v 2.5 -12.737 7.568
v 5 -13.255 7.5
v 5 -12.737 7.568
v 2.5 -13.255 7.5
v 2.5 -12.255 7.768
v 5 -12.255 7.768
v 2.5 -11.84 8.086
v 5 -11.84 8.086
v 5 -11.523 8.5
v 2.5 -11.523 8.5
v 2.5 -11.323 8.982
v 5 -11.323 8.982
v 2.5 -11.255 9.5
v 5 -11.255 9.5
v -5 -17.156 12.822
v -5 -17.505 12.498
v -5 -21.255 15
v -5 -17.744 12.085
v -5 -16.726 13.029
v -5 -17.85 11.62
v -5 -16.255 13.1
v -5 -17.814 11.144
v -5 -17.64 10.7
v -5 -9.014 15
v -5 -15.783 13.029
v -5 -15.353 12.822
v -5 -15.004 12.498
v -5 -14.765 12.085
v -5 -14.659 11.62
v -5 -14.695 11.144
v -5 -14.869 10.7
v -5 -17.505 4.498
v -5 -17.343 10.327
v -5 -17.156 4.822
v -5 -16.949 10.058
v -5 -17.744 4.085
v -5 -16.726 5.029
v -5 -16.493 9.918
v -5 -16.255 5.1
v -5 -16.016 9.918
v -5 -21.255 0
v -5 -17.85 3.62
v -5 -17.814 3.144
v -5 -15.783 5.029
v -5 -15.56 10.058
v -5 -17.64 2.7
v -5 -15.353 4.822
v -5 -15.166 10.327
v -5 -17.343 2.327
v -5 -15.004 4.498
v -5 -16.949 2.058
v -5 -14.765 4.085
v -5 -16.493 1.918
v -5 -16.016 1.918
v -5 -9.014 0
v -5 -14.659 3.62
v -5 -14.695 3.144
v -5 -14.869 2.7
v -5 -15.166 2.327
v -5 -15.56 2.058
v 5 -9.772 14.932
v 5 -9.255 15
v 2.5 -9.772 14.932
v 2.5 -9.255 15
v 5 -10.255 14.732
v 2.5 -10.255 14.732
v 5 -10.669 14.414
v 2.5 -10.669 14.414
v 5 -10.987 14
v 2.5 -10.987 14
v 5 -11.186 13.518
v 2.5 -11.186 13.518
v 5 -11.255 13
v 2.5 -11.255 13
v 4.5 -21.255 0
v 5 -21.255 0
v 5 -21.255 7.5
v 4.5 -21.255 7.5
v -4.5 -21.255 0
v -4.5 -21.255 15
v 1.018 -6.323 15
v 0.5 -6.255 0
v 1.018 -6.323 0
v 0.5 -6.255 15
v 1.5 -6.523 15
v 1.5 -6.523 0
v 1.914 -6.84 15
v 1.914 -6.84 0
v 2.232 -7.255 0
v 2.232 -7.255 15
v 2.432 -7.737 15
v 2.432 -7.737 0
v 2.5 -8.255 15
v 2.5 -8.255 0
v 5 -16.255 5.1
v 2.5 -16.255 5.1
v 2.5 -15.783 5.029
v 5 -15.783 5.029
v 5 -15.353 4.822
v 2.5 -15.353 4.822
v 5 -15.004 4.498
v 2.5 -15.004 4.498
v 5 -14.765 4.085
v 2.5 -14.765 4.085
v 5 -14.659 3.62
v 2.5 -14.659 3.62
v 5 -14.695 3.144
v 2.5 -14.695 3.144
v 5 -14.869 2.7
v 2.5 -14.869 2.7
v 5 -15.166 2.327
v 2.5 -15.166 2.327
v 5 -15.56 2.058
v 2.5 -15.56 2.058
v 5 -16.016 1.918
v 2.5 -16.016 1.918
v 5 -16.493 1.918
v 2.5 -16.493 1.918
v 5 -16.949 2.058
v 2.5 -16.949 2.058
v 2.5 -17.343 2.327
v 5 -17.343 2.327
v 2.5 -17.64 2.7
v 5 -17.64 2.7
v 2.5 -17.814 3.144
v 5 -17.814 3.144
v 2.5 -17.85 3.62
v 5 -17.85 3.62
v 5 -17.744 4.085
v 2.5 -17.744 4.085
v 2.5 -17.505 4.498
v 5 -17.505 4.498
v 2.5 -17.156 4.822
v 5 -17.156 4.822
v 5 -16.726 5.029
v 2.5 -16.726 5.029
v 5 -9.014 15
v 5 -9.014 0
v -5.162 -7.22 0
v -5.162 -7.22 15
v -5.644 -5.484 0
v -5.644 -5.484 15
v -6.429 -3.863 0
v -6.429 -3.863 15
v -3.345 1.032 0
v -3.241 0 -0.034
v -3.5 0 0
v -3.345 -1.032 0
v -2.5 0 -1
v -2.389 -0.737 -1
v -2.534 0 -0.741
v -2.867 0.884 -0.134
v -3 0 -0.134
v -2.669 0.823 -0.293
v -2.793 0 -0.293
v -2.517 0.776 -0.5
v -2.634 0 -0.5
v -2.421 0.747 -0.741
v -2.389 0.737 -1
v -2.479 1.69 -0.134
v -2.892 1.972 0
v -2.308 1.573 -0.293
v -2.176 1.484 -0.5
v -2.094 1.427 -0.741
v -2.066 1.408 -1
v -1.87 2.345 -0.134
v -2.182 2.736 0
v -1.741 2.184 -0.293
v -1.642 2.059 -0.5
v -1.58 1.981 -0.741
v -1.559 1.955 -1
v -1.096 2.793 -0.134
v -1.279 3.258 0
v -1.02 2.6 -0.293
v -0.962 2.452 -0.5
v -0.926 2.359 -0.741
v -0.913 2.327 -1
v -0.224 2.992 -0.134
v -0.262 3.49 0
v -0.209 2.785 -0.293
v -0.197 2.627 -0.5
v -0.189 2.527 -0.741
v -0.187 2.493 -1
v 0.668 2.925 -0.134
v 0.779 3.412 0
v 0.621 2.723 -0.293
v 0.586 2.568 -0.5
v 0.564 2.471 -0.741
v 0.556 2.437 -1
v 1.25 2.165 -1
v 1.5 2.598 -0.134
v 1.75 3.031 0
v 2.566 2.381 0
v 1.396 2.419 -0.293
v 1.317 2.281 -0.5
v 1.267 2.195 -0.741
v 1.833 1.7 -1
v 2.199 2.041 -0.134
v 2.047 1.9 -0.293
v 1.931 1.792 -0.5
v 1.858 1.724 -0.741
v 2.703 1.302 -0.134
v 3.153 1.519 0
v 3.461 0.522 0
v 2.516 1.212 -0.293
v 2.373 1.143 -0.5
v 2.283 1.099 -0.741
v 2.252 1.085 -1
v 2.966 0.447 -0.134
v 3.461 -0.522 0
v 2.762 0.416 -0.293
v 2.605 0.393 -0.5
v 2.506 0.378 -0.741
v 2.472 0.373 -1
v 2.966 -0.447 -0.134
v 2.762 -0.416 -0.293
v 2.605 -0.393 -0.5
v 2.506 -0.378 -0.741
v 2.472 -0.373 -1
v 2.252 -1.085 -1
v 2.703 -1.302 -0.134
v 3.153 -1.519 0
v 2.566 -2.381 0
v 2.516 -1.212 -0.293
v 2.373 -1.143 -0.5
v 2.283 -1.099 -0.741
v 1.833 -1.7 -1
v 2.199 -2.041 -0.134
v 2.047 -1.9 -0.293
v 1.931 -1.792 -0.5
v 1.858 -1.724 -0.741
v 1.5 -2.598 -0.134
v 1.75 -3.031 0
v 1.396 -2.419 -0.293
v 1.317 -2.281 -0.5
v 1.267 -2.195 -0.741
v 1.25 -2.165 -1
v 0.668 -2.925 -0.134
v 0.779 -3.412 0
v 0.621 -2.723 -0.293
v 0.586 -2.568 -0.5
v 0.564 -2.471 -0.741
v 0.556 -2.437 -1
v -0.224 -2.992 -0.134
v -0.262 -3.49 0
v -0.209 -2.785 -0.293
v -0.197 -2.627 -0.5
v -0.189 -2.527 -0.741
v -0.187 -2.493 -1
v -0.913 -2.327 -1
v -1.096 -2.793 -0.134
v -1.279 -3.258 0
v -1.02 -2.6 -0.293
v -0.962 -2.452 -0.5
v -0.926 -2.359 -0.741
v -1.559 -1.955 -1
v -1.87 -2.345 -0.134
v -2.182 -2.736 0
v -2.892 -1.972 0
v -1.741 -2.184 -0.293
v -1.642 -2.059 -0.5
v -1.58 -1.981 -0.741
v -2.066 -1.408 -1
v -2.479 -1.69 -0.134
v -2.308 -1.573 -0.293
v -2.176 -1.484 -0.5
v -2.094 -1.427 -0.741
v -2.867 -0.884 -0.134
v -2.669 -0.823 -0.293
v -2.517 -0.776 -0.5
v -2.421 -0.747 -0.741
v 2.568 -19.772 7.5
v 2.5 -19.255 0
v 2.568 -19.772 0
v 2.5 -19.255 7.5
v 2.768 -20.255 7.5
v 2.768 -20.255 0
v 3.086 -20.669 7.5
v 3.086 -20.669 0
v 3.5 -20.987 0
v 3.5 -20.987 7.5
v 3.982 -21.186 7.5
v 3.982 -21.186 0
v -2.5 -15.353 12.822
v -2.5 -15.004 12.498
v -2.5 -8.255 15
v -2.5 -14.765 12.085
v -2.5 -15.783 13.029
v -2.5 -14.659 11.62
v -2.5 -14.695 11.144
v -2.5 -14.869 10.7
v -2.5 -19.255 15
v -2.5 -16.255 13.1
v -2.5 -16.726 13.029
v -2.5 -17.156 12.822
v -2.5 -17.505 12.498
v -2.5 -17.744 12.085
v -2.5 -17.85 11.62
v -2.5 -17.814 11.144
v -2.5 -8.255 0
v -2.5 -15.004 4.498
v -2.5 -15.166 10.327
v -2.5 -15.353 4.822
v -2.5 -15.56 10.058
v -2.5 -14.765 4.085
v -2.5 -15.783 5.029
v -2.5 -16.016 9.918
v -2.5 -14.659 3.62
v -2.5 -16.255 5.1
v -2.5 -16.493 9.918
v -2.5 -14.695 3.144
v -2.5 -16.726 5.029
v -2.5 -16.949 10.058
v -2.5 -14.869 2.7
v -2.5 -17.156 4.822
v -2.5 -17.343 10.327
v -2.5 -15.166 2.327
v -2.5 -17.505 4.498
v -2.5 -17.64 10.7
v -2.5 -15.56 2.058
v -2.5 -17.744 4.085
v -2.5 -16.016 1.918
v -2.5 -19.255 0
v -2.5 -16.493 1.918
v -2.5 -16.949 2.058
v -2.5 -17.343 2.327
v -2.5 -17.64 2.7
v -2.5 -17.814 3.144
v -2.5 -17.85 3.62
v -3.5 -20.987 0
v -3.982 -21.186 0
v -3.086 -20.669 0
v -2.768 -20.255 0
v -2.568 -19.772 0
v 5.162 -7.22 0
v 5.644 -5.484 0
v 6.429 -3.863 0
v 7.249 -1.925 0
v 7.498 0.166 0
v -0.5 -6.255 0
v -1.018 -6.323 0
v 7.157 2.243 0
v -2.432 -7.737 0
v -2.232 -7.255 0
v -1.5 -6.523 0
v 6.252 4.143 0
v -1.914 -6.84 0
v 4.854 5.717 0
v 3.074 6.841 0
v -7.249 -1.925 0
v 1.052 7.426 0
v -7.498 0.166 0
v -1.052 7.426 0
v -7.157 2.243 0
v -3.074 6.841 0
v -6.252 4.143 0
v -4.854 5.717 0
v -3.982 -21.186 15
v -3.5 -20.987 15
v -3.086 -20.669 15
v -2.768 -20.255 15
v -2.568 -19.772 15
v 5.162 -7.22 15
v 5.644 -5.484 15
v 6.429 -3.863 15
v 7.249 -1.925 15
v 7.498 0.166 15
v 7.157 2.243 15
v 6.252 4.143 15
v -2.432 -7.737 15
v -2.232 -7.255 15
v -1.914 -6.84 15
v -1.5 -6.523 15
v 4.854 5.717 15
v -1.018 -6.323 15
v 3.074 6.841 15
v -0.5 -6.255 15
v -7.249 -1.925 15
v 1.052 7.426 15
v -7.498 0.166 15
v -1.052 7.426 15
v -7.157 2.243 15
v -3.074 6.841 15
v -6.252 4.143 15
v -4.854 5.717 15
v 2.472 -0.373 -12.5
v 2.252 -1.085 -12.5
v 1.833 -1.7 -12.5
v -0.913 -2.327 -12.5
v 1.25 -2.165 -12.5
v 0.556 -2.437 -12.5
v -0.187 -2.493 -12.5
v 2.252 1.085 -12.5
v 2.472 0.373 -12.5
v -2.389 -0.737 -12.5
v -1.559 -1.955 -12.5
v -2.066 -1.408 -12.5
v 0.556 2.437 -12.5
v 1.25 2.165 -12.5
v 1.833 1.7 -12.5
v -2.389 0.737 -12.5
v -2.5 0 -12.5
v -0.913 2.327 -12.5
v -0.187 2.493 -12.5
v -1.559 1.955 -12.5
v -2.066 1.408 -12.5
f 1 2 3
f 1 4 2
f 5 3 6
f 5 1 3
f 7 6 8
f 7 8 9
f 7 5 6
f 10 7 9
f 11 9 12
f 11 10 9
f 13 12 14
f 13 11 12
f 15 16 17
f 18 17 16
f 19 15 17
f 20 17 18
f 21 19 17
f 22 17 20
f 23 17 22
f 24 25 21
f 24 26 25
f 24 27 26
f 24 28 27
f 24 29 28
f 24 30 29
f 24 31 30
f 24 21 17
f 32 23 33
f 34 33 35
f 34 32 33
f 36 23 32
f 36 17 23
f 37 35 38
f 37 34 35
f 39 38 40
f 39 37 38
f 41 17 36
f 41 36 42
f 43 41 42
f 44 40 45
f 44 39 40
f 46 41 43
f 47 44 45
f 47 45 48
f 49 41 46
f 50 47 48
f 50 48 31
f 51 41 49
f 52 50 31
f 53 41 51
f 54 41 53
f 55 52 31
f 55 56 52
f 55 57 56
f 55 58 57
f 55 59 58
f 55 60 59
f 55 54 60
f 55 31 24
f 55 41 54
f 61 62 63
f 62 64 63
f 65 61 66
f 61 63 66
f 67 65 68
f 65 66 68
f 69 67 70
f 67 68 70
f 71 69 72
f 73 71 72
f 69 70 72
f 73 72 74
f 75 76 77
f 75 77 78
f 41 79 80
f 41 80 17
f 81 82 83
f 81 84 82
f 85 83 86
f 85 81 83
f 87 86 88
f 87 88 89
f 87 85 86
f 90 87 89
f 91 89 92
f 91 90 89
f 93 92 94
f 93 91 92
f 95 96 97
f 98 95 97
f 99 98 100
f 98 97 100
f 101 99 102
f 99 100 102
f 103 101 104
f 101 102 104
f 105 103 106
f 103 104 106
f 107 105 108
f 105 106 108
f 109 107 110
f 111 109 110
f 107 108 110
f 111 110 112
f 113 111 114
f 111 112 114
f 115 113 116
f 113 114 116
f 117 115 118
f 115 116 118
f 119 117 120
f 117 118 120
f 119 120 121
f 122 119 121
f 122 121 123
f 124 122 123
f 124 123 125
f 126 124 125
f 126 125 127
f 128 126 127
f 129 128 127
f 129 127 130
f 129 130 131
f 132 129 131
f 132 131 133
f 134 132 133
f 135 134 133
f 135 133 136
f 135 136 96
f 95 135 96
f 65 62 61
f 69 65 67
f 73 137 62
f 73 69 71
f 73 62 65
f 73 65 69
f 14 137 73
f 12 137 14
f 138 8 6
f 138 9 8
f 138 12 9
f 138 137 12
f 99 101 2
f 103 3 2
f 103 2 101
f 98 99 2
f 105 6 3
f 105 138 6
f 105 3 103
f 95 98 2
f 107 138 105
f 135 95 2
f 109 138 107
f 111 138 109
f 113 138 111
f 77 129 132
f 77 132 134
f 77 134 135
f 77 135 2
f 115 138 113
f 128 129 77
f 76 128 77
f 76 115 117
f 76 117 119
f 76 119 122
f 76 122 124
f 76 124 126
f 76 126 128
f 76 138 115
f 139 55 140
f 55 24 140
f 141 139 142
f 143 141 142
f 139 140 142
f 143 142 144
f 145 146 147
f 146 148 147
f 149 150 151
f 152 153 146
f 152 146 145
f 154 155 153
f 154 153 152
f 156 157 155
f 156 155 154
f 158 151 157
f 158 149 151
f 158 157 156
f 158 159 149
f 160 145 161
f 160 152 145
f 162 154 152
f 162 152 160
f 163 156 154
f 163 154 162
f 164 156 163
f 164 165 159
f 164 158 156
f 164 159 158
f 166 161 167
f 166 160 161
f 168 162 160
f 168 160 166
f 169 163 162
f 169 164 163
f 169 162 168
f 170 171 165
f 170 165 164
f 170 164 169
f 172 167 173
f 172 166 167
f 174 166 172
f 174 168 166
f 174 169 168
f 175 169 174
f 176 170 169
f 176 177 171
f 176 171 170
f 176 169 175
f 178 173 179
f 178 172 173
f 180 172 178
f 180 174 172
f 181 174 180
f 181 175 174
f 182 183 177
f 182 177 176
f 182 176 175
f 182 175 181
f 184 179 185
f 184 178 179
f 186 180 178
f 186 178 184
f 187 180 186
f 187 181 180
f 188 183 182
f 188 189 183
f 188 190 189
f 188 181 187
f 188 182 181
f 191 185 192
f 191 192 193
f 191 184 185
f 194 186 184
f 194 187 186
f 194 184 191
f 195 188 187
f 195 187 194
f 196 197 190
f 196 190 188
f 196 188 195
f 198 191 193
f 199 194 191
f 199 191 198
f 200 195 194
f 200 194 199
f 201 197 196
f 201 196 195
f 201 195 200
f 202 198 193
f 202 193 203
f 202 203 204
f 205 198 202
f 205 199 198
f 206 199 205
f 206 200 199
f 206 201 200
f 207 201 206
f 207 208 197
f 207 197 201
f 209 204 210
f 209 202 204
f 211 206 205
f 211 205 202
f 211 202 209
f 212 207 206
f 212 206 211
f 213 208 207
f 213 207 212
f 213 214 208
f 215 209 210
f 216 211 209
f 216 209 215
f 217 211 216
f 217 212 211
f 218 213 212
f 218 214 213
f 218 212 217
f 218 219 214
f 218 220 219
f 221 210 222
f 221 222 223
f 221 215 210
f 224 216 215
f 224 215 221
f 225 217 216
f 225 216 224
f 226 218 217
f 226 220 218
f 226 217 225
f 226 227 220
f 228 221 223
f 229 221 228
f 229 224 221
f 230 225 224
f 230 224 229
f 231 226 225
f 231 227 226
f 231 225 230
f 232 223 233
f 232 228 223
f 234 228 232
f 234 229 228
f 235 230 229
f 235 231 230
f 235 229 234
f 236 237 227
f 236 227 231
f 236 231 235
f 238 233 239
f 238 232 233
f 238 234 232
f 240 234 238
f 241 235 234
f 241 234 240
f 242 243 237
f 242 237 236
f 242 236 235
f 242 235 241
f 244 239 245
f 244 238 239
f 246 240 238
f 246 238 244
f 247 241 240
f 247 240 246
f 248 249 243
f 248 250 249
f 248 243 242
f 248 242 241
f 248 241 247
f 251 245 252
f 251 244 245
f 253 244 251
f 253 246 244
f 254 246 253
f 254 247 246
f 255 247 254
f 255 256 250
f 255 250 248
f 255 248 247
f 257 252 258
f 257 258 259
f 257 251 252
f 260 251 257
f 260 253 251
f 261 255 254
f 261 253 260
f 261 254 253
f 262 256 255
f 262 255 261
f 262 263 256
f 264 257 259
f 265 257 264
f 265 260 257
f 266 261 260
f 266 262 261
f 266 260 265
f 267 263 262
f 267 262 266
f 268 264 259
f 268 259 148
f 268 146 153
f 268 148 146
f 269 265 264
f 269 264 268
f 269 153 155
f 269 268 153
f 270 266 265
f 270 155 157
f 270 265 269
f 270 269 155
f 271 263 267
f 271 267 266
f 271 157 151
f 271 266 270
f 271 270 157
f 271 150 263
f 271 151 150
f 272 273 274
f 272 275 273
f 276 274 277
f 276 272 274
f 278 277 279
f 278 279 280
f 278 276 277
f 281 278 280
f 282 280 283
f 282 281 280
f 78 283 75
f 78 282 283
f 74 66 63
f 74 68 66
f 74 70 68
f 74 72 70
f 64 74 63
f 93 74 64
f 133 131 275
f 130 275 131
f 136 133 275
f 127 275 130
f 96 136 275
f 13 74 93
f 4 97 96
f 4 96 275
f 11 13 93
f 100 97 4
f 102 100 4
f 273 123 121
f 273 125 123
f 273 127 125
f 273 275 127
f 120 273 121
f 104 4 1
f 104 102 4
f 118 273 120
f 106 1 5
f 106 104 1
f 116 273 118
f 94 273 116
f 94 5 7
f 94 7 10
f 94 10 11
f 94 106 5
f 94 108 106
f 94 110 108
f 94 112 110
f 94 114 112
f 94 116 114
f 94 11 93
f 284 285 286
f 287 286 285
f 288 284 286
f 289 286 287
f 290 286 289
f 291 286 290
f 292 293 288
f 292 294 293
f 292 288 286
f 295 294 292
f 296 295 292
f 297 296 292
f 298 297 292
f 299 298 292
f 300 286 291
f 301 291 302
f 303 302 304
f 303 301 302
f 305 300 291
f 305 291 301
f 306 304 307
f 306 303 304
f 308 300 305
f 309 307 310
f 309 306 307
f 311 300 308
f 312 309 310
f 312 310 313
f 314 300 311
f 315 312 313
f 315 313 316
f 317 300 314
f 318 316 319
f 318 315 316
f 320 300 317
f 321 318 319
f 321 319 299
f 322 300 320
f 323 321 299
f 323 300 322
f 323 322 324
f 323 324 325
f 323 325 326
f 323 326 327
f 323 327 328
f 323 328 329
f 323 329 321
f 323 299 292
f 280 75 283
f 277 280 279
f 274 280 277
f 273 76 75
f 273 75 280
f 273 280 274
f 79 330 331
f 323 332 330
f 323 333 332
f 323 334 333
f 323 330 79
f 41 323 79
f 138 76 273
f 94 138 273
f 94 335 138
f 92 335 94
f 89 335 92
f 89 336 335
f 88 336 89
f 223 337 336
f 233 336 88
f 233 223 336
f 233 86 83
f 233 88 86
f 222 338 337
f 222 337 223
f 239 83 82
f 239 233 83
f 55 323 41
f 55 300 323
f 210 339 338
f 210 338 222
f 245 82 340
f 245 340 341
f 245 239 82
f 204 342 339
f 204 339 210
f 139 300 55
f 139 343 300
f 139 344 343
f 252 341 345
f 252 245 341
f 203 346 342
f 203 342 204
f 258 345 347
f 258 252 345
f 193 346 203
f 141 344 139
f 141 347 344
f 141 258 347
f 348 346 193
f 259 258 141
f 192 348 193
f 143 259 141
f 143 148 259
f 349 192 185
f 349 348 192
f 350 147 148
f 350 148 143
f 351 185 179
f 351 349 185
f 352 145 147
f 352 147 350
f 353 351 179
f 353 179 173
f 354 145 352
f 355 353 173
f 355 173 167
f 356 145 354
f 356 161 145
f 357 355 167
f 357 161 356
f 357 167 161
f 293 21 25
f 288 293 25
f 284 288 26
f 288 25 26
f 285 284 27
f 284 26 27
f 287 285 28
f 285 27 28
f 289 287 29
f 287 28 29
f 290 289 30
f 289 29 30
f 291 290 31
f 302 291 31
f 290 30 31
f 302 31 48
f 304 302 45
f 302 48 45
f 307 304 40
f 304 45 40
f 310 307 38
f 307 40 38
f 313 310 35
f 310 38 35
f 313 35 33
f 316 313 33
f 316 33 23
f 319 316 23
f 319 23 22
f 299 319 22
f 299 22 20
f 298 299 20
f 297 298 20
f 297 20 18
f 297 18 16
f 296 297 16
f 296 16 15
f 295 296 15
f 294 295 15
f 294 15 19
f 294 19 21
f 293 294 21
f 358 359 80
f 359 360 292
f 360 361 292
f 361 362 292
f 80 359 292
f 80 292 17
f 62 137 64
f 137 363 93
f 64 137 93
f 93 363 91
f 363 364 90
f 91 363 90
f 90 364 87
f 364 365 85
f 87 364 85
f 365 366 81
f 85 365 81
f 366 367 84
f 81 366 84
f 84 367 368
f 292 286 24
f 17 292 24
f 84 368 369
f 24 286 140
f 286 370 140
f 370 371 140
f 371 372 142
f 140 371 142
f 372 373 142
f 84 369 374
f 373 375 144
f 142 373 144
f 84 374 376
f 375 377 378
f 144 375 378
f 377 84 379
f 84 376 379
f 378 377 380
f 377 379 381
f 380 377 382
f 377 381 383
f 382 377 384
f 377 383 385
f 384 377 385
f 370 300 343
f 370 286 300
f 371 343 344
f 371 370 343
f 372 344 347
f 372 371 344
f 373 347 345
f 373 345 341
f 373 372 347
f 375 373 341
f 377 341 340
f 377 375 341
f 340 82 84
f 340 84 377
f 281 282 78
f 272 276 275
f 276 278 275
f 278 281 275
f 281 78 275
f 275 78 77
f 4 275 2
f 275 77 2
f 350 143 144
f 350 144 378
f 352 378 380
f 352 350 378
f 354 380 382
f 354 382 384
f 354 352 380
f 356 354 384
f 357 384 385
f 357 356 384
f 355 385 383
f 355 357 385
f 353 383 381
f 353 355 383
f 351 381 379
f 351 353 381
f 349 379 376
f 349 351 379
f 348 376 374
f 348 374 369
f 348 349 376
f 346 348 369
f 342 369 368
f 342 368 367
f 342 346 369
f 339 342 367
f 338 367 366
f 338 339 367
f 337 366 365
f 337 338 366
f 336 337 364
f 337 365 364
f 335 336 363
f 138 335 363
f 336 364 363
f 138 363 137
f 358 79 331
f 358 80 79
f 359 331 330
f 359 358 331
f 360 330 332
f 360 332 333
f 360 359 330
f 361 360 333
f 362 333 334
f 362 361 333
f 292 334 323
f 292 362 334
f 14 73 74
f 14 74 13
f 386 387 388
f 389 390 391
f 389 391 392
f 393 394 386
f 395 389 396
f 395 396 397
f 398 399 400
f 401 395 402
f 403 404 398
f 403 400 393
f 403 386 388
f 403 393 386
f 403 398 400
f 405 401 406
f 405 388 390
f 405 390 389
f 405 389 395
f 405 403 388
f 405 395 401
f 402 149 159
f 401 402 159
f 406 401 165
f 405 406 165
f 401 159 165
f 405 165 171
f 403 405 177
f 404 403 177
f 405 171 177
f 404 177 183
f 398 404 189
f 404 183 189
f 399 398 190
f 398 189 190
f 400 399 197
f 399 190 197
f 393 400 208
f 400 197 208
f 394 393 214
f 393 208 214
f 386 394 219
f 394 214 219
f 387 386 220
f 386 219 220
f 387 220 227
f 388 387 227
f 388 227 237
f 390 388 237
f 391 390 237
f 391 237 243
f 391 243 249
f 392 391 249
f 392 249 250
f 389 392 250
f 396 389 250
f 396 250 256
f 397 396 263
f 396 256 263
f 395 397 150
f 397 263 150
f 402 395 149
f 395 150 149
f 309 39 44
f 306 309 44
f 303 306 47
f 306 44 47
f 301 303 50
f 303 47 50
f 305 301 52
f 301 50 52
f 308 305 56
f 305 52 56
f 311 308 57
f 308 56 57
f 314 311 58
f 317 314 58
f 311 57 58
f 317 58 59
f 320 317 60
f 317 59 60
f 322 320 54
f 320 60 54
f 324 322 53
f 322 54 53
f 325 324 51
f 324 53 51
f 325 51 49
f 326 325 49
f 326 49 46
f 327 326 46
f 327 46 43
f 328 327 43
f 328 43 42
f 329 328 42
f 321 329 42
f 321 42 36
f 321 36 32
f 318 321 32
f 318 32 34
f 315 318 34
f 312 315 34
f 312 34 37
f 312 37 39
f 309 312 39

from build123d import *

# Parameters (mm, degrees)
BOSS_EXTRUDE1_DEPTH = 15
FILLET1_R           = 10
SKETCH3_R           = 2.5
BOSS_EXTRUDE2_DEPTH = 12.5
CUT_EXTRUDE4_REACH  = 30.862
SKETCH7_W           = 7.5
SKETCH7_H           = 10
CUT_EXTRUDE7_REACH  = 30.862
SKETCH10_R          = 1.6
SKETCH9_R           = 1.6
CUT_EXTRUDE8_DEPTH  = 29.861852882
FILLET2_R           = 2
FILLET3_R           = 1
FILLET4_R           = 2


with BuildPart() as part:
    # Sketch2 → Boss-Extrude1 (new body)
    with BuildSketch(Plane.XY):
        with BuildLine():
            Line((-2.5, -6.254565433), (-2.5, -21.254565433))
            Line((-2.5, -21.254565433), (-5, -21.254565433))
            Line((-5, -21.254565433), (-5, -6.254565433))
            Line((-5, -6.254565433), (-5, -5.590169944))
            ThreePointArc((-5, -5.590169944), (0, 7.5), (5, -5.590169944))
            Line((5, -5.590169944), (5, -6.254565433))
            Line((5, -6.254565433), (5, -21.254565433))
            Line((5, -21.254565433), (2.5, -21.254565433))
            Line((2.5, -21.254565433), (2.5, -6.254565433))
            Line((2.5, -6.254565433), (-2.5, -6.254565433))
        make_face()
    extrude(amount=BOSS_EXTRUDE1_DEPTH)

    # Fillet1
    fillet1_edges = [part.edges().sort_by_distance(p)[0] for p in [
        (-5, -5.590169944, 7.5),
        (5, -5.590169944, 7.5),
    ]]
    fillet(fillet1_edges, radius=FILLET1_R)

    # Sketch3 → Boss-Extrude2 (add)
    with BuildSketch(Plane(origin=(0, 0, 0), x_dir=(-1, 0, 0), z_dir=(0, 0, -1))):
        Circle(SKETCH3_R)
    extrude(amount=BOSS_EXTRUDE2_DEPTH)

    # Sketch7 → Cut-Extrude4 (cut, up to next)
    with BuildSketch(Plane(origin=(5, 0, 0), x_dir=(0, 0, -1), z_dir=(1, 0, 0)), mode=Mode.PRIVATE) as cut_extrude4_sk1:
        with Locations((-11.25, -16.254565433)):
            Rectangle(SKETCH7_W, SKETCH7_H)
    cut_extrude4_tool1 = extrude(cut_extrude4_sk1.sketch, amount=-CUT_EXTRUDE4_REACH, mode=Mode.PRIVATE) & part.part
    add(cut_extrude4_tool1.solids().sort_by_distance((5, -16.254565, 11.25))[0], mode=Mode.SUBTRACT)

    # Sketch10 → Cut-Extrude7 (cut, up to next)
    with BuildSketch(Plane.ZY.offset(5), mode=Mode.PRIVATE) as cut_extrude7_sk1:
        with Locations((11.5, -16.254565433)):
            Circle(SKETCH10_R)
    cut_extrude7_tool1 = extrude(cut_extrude7_sk1.sketch, amount=-CUT_EXTRUDE7_REACH, mode=Mode.PRIVATE) & part.part
    add(cut_extrude7_tool1.solids().sort_by_distance((-5, -16.254565, 11.5))[0], mode=Mode.SUBTRACT)

    # Sketch9 → Cut-Extrude8 (cut, through all)
    with BuildSketch(Plane.ZY.offset(5)):
        with Locations((3.5, -16.254565433)):
            Circle(SKETCH9_R)
    extrude(amount=-CUT_EXTRUDE8_DEPTH, mode=Mode.SUBTRACT)

    # Fillet2
    fillet2_edges = [part.edges().sort_by_distance(p)[0] for p in [
        (-2.5, -6.254565433, 7.5),
        (-2.5, -21.254565433, 7.5),
        (2.5, -6.254565433, 7.5),
        (2.5, -21.254565433, 3.75),
    ]]
    fillet(fillet2_edges, radius=FILLET2_R)

    # Fillet3
    fillet3_edges = [part.edges().sort_by_distance(p)[0] for p in [
        (2.5, 0, 0),
    ]]
    fillet(fillet3_edges, radius=FILLET3_R)

    # Fillet4
    fillet4_edges = [part.edges().sort_by_distance(p)[0] for p in [
        (3.75, -11.254565433, 15),
        (3.75, -11.254565433, 7.5),
    ]]
    fillet(fillet4_edges, radius=FILLET4_R)


solid = part.part
